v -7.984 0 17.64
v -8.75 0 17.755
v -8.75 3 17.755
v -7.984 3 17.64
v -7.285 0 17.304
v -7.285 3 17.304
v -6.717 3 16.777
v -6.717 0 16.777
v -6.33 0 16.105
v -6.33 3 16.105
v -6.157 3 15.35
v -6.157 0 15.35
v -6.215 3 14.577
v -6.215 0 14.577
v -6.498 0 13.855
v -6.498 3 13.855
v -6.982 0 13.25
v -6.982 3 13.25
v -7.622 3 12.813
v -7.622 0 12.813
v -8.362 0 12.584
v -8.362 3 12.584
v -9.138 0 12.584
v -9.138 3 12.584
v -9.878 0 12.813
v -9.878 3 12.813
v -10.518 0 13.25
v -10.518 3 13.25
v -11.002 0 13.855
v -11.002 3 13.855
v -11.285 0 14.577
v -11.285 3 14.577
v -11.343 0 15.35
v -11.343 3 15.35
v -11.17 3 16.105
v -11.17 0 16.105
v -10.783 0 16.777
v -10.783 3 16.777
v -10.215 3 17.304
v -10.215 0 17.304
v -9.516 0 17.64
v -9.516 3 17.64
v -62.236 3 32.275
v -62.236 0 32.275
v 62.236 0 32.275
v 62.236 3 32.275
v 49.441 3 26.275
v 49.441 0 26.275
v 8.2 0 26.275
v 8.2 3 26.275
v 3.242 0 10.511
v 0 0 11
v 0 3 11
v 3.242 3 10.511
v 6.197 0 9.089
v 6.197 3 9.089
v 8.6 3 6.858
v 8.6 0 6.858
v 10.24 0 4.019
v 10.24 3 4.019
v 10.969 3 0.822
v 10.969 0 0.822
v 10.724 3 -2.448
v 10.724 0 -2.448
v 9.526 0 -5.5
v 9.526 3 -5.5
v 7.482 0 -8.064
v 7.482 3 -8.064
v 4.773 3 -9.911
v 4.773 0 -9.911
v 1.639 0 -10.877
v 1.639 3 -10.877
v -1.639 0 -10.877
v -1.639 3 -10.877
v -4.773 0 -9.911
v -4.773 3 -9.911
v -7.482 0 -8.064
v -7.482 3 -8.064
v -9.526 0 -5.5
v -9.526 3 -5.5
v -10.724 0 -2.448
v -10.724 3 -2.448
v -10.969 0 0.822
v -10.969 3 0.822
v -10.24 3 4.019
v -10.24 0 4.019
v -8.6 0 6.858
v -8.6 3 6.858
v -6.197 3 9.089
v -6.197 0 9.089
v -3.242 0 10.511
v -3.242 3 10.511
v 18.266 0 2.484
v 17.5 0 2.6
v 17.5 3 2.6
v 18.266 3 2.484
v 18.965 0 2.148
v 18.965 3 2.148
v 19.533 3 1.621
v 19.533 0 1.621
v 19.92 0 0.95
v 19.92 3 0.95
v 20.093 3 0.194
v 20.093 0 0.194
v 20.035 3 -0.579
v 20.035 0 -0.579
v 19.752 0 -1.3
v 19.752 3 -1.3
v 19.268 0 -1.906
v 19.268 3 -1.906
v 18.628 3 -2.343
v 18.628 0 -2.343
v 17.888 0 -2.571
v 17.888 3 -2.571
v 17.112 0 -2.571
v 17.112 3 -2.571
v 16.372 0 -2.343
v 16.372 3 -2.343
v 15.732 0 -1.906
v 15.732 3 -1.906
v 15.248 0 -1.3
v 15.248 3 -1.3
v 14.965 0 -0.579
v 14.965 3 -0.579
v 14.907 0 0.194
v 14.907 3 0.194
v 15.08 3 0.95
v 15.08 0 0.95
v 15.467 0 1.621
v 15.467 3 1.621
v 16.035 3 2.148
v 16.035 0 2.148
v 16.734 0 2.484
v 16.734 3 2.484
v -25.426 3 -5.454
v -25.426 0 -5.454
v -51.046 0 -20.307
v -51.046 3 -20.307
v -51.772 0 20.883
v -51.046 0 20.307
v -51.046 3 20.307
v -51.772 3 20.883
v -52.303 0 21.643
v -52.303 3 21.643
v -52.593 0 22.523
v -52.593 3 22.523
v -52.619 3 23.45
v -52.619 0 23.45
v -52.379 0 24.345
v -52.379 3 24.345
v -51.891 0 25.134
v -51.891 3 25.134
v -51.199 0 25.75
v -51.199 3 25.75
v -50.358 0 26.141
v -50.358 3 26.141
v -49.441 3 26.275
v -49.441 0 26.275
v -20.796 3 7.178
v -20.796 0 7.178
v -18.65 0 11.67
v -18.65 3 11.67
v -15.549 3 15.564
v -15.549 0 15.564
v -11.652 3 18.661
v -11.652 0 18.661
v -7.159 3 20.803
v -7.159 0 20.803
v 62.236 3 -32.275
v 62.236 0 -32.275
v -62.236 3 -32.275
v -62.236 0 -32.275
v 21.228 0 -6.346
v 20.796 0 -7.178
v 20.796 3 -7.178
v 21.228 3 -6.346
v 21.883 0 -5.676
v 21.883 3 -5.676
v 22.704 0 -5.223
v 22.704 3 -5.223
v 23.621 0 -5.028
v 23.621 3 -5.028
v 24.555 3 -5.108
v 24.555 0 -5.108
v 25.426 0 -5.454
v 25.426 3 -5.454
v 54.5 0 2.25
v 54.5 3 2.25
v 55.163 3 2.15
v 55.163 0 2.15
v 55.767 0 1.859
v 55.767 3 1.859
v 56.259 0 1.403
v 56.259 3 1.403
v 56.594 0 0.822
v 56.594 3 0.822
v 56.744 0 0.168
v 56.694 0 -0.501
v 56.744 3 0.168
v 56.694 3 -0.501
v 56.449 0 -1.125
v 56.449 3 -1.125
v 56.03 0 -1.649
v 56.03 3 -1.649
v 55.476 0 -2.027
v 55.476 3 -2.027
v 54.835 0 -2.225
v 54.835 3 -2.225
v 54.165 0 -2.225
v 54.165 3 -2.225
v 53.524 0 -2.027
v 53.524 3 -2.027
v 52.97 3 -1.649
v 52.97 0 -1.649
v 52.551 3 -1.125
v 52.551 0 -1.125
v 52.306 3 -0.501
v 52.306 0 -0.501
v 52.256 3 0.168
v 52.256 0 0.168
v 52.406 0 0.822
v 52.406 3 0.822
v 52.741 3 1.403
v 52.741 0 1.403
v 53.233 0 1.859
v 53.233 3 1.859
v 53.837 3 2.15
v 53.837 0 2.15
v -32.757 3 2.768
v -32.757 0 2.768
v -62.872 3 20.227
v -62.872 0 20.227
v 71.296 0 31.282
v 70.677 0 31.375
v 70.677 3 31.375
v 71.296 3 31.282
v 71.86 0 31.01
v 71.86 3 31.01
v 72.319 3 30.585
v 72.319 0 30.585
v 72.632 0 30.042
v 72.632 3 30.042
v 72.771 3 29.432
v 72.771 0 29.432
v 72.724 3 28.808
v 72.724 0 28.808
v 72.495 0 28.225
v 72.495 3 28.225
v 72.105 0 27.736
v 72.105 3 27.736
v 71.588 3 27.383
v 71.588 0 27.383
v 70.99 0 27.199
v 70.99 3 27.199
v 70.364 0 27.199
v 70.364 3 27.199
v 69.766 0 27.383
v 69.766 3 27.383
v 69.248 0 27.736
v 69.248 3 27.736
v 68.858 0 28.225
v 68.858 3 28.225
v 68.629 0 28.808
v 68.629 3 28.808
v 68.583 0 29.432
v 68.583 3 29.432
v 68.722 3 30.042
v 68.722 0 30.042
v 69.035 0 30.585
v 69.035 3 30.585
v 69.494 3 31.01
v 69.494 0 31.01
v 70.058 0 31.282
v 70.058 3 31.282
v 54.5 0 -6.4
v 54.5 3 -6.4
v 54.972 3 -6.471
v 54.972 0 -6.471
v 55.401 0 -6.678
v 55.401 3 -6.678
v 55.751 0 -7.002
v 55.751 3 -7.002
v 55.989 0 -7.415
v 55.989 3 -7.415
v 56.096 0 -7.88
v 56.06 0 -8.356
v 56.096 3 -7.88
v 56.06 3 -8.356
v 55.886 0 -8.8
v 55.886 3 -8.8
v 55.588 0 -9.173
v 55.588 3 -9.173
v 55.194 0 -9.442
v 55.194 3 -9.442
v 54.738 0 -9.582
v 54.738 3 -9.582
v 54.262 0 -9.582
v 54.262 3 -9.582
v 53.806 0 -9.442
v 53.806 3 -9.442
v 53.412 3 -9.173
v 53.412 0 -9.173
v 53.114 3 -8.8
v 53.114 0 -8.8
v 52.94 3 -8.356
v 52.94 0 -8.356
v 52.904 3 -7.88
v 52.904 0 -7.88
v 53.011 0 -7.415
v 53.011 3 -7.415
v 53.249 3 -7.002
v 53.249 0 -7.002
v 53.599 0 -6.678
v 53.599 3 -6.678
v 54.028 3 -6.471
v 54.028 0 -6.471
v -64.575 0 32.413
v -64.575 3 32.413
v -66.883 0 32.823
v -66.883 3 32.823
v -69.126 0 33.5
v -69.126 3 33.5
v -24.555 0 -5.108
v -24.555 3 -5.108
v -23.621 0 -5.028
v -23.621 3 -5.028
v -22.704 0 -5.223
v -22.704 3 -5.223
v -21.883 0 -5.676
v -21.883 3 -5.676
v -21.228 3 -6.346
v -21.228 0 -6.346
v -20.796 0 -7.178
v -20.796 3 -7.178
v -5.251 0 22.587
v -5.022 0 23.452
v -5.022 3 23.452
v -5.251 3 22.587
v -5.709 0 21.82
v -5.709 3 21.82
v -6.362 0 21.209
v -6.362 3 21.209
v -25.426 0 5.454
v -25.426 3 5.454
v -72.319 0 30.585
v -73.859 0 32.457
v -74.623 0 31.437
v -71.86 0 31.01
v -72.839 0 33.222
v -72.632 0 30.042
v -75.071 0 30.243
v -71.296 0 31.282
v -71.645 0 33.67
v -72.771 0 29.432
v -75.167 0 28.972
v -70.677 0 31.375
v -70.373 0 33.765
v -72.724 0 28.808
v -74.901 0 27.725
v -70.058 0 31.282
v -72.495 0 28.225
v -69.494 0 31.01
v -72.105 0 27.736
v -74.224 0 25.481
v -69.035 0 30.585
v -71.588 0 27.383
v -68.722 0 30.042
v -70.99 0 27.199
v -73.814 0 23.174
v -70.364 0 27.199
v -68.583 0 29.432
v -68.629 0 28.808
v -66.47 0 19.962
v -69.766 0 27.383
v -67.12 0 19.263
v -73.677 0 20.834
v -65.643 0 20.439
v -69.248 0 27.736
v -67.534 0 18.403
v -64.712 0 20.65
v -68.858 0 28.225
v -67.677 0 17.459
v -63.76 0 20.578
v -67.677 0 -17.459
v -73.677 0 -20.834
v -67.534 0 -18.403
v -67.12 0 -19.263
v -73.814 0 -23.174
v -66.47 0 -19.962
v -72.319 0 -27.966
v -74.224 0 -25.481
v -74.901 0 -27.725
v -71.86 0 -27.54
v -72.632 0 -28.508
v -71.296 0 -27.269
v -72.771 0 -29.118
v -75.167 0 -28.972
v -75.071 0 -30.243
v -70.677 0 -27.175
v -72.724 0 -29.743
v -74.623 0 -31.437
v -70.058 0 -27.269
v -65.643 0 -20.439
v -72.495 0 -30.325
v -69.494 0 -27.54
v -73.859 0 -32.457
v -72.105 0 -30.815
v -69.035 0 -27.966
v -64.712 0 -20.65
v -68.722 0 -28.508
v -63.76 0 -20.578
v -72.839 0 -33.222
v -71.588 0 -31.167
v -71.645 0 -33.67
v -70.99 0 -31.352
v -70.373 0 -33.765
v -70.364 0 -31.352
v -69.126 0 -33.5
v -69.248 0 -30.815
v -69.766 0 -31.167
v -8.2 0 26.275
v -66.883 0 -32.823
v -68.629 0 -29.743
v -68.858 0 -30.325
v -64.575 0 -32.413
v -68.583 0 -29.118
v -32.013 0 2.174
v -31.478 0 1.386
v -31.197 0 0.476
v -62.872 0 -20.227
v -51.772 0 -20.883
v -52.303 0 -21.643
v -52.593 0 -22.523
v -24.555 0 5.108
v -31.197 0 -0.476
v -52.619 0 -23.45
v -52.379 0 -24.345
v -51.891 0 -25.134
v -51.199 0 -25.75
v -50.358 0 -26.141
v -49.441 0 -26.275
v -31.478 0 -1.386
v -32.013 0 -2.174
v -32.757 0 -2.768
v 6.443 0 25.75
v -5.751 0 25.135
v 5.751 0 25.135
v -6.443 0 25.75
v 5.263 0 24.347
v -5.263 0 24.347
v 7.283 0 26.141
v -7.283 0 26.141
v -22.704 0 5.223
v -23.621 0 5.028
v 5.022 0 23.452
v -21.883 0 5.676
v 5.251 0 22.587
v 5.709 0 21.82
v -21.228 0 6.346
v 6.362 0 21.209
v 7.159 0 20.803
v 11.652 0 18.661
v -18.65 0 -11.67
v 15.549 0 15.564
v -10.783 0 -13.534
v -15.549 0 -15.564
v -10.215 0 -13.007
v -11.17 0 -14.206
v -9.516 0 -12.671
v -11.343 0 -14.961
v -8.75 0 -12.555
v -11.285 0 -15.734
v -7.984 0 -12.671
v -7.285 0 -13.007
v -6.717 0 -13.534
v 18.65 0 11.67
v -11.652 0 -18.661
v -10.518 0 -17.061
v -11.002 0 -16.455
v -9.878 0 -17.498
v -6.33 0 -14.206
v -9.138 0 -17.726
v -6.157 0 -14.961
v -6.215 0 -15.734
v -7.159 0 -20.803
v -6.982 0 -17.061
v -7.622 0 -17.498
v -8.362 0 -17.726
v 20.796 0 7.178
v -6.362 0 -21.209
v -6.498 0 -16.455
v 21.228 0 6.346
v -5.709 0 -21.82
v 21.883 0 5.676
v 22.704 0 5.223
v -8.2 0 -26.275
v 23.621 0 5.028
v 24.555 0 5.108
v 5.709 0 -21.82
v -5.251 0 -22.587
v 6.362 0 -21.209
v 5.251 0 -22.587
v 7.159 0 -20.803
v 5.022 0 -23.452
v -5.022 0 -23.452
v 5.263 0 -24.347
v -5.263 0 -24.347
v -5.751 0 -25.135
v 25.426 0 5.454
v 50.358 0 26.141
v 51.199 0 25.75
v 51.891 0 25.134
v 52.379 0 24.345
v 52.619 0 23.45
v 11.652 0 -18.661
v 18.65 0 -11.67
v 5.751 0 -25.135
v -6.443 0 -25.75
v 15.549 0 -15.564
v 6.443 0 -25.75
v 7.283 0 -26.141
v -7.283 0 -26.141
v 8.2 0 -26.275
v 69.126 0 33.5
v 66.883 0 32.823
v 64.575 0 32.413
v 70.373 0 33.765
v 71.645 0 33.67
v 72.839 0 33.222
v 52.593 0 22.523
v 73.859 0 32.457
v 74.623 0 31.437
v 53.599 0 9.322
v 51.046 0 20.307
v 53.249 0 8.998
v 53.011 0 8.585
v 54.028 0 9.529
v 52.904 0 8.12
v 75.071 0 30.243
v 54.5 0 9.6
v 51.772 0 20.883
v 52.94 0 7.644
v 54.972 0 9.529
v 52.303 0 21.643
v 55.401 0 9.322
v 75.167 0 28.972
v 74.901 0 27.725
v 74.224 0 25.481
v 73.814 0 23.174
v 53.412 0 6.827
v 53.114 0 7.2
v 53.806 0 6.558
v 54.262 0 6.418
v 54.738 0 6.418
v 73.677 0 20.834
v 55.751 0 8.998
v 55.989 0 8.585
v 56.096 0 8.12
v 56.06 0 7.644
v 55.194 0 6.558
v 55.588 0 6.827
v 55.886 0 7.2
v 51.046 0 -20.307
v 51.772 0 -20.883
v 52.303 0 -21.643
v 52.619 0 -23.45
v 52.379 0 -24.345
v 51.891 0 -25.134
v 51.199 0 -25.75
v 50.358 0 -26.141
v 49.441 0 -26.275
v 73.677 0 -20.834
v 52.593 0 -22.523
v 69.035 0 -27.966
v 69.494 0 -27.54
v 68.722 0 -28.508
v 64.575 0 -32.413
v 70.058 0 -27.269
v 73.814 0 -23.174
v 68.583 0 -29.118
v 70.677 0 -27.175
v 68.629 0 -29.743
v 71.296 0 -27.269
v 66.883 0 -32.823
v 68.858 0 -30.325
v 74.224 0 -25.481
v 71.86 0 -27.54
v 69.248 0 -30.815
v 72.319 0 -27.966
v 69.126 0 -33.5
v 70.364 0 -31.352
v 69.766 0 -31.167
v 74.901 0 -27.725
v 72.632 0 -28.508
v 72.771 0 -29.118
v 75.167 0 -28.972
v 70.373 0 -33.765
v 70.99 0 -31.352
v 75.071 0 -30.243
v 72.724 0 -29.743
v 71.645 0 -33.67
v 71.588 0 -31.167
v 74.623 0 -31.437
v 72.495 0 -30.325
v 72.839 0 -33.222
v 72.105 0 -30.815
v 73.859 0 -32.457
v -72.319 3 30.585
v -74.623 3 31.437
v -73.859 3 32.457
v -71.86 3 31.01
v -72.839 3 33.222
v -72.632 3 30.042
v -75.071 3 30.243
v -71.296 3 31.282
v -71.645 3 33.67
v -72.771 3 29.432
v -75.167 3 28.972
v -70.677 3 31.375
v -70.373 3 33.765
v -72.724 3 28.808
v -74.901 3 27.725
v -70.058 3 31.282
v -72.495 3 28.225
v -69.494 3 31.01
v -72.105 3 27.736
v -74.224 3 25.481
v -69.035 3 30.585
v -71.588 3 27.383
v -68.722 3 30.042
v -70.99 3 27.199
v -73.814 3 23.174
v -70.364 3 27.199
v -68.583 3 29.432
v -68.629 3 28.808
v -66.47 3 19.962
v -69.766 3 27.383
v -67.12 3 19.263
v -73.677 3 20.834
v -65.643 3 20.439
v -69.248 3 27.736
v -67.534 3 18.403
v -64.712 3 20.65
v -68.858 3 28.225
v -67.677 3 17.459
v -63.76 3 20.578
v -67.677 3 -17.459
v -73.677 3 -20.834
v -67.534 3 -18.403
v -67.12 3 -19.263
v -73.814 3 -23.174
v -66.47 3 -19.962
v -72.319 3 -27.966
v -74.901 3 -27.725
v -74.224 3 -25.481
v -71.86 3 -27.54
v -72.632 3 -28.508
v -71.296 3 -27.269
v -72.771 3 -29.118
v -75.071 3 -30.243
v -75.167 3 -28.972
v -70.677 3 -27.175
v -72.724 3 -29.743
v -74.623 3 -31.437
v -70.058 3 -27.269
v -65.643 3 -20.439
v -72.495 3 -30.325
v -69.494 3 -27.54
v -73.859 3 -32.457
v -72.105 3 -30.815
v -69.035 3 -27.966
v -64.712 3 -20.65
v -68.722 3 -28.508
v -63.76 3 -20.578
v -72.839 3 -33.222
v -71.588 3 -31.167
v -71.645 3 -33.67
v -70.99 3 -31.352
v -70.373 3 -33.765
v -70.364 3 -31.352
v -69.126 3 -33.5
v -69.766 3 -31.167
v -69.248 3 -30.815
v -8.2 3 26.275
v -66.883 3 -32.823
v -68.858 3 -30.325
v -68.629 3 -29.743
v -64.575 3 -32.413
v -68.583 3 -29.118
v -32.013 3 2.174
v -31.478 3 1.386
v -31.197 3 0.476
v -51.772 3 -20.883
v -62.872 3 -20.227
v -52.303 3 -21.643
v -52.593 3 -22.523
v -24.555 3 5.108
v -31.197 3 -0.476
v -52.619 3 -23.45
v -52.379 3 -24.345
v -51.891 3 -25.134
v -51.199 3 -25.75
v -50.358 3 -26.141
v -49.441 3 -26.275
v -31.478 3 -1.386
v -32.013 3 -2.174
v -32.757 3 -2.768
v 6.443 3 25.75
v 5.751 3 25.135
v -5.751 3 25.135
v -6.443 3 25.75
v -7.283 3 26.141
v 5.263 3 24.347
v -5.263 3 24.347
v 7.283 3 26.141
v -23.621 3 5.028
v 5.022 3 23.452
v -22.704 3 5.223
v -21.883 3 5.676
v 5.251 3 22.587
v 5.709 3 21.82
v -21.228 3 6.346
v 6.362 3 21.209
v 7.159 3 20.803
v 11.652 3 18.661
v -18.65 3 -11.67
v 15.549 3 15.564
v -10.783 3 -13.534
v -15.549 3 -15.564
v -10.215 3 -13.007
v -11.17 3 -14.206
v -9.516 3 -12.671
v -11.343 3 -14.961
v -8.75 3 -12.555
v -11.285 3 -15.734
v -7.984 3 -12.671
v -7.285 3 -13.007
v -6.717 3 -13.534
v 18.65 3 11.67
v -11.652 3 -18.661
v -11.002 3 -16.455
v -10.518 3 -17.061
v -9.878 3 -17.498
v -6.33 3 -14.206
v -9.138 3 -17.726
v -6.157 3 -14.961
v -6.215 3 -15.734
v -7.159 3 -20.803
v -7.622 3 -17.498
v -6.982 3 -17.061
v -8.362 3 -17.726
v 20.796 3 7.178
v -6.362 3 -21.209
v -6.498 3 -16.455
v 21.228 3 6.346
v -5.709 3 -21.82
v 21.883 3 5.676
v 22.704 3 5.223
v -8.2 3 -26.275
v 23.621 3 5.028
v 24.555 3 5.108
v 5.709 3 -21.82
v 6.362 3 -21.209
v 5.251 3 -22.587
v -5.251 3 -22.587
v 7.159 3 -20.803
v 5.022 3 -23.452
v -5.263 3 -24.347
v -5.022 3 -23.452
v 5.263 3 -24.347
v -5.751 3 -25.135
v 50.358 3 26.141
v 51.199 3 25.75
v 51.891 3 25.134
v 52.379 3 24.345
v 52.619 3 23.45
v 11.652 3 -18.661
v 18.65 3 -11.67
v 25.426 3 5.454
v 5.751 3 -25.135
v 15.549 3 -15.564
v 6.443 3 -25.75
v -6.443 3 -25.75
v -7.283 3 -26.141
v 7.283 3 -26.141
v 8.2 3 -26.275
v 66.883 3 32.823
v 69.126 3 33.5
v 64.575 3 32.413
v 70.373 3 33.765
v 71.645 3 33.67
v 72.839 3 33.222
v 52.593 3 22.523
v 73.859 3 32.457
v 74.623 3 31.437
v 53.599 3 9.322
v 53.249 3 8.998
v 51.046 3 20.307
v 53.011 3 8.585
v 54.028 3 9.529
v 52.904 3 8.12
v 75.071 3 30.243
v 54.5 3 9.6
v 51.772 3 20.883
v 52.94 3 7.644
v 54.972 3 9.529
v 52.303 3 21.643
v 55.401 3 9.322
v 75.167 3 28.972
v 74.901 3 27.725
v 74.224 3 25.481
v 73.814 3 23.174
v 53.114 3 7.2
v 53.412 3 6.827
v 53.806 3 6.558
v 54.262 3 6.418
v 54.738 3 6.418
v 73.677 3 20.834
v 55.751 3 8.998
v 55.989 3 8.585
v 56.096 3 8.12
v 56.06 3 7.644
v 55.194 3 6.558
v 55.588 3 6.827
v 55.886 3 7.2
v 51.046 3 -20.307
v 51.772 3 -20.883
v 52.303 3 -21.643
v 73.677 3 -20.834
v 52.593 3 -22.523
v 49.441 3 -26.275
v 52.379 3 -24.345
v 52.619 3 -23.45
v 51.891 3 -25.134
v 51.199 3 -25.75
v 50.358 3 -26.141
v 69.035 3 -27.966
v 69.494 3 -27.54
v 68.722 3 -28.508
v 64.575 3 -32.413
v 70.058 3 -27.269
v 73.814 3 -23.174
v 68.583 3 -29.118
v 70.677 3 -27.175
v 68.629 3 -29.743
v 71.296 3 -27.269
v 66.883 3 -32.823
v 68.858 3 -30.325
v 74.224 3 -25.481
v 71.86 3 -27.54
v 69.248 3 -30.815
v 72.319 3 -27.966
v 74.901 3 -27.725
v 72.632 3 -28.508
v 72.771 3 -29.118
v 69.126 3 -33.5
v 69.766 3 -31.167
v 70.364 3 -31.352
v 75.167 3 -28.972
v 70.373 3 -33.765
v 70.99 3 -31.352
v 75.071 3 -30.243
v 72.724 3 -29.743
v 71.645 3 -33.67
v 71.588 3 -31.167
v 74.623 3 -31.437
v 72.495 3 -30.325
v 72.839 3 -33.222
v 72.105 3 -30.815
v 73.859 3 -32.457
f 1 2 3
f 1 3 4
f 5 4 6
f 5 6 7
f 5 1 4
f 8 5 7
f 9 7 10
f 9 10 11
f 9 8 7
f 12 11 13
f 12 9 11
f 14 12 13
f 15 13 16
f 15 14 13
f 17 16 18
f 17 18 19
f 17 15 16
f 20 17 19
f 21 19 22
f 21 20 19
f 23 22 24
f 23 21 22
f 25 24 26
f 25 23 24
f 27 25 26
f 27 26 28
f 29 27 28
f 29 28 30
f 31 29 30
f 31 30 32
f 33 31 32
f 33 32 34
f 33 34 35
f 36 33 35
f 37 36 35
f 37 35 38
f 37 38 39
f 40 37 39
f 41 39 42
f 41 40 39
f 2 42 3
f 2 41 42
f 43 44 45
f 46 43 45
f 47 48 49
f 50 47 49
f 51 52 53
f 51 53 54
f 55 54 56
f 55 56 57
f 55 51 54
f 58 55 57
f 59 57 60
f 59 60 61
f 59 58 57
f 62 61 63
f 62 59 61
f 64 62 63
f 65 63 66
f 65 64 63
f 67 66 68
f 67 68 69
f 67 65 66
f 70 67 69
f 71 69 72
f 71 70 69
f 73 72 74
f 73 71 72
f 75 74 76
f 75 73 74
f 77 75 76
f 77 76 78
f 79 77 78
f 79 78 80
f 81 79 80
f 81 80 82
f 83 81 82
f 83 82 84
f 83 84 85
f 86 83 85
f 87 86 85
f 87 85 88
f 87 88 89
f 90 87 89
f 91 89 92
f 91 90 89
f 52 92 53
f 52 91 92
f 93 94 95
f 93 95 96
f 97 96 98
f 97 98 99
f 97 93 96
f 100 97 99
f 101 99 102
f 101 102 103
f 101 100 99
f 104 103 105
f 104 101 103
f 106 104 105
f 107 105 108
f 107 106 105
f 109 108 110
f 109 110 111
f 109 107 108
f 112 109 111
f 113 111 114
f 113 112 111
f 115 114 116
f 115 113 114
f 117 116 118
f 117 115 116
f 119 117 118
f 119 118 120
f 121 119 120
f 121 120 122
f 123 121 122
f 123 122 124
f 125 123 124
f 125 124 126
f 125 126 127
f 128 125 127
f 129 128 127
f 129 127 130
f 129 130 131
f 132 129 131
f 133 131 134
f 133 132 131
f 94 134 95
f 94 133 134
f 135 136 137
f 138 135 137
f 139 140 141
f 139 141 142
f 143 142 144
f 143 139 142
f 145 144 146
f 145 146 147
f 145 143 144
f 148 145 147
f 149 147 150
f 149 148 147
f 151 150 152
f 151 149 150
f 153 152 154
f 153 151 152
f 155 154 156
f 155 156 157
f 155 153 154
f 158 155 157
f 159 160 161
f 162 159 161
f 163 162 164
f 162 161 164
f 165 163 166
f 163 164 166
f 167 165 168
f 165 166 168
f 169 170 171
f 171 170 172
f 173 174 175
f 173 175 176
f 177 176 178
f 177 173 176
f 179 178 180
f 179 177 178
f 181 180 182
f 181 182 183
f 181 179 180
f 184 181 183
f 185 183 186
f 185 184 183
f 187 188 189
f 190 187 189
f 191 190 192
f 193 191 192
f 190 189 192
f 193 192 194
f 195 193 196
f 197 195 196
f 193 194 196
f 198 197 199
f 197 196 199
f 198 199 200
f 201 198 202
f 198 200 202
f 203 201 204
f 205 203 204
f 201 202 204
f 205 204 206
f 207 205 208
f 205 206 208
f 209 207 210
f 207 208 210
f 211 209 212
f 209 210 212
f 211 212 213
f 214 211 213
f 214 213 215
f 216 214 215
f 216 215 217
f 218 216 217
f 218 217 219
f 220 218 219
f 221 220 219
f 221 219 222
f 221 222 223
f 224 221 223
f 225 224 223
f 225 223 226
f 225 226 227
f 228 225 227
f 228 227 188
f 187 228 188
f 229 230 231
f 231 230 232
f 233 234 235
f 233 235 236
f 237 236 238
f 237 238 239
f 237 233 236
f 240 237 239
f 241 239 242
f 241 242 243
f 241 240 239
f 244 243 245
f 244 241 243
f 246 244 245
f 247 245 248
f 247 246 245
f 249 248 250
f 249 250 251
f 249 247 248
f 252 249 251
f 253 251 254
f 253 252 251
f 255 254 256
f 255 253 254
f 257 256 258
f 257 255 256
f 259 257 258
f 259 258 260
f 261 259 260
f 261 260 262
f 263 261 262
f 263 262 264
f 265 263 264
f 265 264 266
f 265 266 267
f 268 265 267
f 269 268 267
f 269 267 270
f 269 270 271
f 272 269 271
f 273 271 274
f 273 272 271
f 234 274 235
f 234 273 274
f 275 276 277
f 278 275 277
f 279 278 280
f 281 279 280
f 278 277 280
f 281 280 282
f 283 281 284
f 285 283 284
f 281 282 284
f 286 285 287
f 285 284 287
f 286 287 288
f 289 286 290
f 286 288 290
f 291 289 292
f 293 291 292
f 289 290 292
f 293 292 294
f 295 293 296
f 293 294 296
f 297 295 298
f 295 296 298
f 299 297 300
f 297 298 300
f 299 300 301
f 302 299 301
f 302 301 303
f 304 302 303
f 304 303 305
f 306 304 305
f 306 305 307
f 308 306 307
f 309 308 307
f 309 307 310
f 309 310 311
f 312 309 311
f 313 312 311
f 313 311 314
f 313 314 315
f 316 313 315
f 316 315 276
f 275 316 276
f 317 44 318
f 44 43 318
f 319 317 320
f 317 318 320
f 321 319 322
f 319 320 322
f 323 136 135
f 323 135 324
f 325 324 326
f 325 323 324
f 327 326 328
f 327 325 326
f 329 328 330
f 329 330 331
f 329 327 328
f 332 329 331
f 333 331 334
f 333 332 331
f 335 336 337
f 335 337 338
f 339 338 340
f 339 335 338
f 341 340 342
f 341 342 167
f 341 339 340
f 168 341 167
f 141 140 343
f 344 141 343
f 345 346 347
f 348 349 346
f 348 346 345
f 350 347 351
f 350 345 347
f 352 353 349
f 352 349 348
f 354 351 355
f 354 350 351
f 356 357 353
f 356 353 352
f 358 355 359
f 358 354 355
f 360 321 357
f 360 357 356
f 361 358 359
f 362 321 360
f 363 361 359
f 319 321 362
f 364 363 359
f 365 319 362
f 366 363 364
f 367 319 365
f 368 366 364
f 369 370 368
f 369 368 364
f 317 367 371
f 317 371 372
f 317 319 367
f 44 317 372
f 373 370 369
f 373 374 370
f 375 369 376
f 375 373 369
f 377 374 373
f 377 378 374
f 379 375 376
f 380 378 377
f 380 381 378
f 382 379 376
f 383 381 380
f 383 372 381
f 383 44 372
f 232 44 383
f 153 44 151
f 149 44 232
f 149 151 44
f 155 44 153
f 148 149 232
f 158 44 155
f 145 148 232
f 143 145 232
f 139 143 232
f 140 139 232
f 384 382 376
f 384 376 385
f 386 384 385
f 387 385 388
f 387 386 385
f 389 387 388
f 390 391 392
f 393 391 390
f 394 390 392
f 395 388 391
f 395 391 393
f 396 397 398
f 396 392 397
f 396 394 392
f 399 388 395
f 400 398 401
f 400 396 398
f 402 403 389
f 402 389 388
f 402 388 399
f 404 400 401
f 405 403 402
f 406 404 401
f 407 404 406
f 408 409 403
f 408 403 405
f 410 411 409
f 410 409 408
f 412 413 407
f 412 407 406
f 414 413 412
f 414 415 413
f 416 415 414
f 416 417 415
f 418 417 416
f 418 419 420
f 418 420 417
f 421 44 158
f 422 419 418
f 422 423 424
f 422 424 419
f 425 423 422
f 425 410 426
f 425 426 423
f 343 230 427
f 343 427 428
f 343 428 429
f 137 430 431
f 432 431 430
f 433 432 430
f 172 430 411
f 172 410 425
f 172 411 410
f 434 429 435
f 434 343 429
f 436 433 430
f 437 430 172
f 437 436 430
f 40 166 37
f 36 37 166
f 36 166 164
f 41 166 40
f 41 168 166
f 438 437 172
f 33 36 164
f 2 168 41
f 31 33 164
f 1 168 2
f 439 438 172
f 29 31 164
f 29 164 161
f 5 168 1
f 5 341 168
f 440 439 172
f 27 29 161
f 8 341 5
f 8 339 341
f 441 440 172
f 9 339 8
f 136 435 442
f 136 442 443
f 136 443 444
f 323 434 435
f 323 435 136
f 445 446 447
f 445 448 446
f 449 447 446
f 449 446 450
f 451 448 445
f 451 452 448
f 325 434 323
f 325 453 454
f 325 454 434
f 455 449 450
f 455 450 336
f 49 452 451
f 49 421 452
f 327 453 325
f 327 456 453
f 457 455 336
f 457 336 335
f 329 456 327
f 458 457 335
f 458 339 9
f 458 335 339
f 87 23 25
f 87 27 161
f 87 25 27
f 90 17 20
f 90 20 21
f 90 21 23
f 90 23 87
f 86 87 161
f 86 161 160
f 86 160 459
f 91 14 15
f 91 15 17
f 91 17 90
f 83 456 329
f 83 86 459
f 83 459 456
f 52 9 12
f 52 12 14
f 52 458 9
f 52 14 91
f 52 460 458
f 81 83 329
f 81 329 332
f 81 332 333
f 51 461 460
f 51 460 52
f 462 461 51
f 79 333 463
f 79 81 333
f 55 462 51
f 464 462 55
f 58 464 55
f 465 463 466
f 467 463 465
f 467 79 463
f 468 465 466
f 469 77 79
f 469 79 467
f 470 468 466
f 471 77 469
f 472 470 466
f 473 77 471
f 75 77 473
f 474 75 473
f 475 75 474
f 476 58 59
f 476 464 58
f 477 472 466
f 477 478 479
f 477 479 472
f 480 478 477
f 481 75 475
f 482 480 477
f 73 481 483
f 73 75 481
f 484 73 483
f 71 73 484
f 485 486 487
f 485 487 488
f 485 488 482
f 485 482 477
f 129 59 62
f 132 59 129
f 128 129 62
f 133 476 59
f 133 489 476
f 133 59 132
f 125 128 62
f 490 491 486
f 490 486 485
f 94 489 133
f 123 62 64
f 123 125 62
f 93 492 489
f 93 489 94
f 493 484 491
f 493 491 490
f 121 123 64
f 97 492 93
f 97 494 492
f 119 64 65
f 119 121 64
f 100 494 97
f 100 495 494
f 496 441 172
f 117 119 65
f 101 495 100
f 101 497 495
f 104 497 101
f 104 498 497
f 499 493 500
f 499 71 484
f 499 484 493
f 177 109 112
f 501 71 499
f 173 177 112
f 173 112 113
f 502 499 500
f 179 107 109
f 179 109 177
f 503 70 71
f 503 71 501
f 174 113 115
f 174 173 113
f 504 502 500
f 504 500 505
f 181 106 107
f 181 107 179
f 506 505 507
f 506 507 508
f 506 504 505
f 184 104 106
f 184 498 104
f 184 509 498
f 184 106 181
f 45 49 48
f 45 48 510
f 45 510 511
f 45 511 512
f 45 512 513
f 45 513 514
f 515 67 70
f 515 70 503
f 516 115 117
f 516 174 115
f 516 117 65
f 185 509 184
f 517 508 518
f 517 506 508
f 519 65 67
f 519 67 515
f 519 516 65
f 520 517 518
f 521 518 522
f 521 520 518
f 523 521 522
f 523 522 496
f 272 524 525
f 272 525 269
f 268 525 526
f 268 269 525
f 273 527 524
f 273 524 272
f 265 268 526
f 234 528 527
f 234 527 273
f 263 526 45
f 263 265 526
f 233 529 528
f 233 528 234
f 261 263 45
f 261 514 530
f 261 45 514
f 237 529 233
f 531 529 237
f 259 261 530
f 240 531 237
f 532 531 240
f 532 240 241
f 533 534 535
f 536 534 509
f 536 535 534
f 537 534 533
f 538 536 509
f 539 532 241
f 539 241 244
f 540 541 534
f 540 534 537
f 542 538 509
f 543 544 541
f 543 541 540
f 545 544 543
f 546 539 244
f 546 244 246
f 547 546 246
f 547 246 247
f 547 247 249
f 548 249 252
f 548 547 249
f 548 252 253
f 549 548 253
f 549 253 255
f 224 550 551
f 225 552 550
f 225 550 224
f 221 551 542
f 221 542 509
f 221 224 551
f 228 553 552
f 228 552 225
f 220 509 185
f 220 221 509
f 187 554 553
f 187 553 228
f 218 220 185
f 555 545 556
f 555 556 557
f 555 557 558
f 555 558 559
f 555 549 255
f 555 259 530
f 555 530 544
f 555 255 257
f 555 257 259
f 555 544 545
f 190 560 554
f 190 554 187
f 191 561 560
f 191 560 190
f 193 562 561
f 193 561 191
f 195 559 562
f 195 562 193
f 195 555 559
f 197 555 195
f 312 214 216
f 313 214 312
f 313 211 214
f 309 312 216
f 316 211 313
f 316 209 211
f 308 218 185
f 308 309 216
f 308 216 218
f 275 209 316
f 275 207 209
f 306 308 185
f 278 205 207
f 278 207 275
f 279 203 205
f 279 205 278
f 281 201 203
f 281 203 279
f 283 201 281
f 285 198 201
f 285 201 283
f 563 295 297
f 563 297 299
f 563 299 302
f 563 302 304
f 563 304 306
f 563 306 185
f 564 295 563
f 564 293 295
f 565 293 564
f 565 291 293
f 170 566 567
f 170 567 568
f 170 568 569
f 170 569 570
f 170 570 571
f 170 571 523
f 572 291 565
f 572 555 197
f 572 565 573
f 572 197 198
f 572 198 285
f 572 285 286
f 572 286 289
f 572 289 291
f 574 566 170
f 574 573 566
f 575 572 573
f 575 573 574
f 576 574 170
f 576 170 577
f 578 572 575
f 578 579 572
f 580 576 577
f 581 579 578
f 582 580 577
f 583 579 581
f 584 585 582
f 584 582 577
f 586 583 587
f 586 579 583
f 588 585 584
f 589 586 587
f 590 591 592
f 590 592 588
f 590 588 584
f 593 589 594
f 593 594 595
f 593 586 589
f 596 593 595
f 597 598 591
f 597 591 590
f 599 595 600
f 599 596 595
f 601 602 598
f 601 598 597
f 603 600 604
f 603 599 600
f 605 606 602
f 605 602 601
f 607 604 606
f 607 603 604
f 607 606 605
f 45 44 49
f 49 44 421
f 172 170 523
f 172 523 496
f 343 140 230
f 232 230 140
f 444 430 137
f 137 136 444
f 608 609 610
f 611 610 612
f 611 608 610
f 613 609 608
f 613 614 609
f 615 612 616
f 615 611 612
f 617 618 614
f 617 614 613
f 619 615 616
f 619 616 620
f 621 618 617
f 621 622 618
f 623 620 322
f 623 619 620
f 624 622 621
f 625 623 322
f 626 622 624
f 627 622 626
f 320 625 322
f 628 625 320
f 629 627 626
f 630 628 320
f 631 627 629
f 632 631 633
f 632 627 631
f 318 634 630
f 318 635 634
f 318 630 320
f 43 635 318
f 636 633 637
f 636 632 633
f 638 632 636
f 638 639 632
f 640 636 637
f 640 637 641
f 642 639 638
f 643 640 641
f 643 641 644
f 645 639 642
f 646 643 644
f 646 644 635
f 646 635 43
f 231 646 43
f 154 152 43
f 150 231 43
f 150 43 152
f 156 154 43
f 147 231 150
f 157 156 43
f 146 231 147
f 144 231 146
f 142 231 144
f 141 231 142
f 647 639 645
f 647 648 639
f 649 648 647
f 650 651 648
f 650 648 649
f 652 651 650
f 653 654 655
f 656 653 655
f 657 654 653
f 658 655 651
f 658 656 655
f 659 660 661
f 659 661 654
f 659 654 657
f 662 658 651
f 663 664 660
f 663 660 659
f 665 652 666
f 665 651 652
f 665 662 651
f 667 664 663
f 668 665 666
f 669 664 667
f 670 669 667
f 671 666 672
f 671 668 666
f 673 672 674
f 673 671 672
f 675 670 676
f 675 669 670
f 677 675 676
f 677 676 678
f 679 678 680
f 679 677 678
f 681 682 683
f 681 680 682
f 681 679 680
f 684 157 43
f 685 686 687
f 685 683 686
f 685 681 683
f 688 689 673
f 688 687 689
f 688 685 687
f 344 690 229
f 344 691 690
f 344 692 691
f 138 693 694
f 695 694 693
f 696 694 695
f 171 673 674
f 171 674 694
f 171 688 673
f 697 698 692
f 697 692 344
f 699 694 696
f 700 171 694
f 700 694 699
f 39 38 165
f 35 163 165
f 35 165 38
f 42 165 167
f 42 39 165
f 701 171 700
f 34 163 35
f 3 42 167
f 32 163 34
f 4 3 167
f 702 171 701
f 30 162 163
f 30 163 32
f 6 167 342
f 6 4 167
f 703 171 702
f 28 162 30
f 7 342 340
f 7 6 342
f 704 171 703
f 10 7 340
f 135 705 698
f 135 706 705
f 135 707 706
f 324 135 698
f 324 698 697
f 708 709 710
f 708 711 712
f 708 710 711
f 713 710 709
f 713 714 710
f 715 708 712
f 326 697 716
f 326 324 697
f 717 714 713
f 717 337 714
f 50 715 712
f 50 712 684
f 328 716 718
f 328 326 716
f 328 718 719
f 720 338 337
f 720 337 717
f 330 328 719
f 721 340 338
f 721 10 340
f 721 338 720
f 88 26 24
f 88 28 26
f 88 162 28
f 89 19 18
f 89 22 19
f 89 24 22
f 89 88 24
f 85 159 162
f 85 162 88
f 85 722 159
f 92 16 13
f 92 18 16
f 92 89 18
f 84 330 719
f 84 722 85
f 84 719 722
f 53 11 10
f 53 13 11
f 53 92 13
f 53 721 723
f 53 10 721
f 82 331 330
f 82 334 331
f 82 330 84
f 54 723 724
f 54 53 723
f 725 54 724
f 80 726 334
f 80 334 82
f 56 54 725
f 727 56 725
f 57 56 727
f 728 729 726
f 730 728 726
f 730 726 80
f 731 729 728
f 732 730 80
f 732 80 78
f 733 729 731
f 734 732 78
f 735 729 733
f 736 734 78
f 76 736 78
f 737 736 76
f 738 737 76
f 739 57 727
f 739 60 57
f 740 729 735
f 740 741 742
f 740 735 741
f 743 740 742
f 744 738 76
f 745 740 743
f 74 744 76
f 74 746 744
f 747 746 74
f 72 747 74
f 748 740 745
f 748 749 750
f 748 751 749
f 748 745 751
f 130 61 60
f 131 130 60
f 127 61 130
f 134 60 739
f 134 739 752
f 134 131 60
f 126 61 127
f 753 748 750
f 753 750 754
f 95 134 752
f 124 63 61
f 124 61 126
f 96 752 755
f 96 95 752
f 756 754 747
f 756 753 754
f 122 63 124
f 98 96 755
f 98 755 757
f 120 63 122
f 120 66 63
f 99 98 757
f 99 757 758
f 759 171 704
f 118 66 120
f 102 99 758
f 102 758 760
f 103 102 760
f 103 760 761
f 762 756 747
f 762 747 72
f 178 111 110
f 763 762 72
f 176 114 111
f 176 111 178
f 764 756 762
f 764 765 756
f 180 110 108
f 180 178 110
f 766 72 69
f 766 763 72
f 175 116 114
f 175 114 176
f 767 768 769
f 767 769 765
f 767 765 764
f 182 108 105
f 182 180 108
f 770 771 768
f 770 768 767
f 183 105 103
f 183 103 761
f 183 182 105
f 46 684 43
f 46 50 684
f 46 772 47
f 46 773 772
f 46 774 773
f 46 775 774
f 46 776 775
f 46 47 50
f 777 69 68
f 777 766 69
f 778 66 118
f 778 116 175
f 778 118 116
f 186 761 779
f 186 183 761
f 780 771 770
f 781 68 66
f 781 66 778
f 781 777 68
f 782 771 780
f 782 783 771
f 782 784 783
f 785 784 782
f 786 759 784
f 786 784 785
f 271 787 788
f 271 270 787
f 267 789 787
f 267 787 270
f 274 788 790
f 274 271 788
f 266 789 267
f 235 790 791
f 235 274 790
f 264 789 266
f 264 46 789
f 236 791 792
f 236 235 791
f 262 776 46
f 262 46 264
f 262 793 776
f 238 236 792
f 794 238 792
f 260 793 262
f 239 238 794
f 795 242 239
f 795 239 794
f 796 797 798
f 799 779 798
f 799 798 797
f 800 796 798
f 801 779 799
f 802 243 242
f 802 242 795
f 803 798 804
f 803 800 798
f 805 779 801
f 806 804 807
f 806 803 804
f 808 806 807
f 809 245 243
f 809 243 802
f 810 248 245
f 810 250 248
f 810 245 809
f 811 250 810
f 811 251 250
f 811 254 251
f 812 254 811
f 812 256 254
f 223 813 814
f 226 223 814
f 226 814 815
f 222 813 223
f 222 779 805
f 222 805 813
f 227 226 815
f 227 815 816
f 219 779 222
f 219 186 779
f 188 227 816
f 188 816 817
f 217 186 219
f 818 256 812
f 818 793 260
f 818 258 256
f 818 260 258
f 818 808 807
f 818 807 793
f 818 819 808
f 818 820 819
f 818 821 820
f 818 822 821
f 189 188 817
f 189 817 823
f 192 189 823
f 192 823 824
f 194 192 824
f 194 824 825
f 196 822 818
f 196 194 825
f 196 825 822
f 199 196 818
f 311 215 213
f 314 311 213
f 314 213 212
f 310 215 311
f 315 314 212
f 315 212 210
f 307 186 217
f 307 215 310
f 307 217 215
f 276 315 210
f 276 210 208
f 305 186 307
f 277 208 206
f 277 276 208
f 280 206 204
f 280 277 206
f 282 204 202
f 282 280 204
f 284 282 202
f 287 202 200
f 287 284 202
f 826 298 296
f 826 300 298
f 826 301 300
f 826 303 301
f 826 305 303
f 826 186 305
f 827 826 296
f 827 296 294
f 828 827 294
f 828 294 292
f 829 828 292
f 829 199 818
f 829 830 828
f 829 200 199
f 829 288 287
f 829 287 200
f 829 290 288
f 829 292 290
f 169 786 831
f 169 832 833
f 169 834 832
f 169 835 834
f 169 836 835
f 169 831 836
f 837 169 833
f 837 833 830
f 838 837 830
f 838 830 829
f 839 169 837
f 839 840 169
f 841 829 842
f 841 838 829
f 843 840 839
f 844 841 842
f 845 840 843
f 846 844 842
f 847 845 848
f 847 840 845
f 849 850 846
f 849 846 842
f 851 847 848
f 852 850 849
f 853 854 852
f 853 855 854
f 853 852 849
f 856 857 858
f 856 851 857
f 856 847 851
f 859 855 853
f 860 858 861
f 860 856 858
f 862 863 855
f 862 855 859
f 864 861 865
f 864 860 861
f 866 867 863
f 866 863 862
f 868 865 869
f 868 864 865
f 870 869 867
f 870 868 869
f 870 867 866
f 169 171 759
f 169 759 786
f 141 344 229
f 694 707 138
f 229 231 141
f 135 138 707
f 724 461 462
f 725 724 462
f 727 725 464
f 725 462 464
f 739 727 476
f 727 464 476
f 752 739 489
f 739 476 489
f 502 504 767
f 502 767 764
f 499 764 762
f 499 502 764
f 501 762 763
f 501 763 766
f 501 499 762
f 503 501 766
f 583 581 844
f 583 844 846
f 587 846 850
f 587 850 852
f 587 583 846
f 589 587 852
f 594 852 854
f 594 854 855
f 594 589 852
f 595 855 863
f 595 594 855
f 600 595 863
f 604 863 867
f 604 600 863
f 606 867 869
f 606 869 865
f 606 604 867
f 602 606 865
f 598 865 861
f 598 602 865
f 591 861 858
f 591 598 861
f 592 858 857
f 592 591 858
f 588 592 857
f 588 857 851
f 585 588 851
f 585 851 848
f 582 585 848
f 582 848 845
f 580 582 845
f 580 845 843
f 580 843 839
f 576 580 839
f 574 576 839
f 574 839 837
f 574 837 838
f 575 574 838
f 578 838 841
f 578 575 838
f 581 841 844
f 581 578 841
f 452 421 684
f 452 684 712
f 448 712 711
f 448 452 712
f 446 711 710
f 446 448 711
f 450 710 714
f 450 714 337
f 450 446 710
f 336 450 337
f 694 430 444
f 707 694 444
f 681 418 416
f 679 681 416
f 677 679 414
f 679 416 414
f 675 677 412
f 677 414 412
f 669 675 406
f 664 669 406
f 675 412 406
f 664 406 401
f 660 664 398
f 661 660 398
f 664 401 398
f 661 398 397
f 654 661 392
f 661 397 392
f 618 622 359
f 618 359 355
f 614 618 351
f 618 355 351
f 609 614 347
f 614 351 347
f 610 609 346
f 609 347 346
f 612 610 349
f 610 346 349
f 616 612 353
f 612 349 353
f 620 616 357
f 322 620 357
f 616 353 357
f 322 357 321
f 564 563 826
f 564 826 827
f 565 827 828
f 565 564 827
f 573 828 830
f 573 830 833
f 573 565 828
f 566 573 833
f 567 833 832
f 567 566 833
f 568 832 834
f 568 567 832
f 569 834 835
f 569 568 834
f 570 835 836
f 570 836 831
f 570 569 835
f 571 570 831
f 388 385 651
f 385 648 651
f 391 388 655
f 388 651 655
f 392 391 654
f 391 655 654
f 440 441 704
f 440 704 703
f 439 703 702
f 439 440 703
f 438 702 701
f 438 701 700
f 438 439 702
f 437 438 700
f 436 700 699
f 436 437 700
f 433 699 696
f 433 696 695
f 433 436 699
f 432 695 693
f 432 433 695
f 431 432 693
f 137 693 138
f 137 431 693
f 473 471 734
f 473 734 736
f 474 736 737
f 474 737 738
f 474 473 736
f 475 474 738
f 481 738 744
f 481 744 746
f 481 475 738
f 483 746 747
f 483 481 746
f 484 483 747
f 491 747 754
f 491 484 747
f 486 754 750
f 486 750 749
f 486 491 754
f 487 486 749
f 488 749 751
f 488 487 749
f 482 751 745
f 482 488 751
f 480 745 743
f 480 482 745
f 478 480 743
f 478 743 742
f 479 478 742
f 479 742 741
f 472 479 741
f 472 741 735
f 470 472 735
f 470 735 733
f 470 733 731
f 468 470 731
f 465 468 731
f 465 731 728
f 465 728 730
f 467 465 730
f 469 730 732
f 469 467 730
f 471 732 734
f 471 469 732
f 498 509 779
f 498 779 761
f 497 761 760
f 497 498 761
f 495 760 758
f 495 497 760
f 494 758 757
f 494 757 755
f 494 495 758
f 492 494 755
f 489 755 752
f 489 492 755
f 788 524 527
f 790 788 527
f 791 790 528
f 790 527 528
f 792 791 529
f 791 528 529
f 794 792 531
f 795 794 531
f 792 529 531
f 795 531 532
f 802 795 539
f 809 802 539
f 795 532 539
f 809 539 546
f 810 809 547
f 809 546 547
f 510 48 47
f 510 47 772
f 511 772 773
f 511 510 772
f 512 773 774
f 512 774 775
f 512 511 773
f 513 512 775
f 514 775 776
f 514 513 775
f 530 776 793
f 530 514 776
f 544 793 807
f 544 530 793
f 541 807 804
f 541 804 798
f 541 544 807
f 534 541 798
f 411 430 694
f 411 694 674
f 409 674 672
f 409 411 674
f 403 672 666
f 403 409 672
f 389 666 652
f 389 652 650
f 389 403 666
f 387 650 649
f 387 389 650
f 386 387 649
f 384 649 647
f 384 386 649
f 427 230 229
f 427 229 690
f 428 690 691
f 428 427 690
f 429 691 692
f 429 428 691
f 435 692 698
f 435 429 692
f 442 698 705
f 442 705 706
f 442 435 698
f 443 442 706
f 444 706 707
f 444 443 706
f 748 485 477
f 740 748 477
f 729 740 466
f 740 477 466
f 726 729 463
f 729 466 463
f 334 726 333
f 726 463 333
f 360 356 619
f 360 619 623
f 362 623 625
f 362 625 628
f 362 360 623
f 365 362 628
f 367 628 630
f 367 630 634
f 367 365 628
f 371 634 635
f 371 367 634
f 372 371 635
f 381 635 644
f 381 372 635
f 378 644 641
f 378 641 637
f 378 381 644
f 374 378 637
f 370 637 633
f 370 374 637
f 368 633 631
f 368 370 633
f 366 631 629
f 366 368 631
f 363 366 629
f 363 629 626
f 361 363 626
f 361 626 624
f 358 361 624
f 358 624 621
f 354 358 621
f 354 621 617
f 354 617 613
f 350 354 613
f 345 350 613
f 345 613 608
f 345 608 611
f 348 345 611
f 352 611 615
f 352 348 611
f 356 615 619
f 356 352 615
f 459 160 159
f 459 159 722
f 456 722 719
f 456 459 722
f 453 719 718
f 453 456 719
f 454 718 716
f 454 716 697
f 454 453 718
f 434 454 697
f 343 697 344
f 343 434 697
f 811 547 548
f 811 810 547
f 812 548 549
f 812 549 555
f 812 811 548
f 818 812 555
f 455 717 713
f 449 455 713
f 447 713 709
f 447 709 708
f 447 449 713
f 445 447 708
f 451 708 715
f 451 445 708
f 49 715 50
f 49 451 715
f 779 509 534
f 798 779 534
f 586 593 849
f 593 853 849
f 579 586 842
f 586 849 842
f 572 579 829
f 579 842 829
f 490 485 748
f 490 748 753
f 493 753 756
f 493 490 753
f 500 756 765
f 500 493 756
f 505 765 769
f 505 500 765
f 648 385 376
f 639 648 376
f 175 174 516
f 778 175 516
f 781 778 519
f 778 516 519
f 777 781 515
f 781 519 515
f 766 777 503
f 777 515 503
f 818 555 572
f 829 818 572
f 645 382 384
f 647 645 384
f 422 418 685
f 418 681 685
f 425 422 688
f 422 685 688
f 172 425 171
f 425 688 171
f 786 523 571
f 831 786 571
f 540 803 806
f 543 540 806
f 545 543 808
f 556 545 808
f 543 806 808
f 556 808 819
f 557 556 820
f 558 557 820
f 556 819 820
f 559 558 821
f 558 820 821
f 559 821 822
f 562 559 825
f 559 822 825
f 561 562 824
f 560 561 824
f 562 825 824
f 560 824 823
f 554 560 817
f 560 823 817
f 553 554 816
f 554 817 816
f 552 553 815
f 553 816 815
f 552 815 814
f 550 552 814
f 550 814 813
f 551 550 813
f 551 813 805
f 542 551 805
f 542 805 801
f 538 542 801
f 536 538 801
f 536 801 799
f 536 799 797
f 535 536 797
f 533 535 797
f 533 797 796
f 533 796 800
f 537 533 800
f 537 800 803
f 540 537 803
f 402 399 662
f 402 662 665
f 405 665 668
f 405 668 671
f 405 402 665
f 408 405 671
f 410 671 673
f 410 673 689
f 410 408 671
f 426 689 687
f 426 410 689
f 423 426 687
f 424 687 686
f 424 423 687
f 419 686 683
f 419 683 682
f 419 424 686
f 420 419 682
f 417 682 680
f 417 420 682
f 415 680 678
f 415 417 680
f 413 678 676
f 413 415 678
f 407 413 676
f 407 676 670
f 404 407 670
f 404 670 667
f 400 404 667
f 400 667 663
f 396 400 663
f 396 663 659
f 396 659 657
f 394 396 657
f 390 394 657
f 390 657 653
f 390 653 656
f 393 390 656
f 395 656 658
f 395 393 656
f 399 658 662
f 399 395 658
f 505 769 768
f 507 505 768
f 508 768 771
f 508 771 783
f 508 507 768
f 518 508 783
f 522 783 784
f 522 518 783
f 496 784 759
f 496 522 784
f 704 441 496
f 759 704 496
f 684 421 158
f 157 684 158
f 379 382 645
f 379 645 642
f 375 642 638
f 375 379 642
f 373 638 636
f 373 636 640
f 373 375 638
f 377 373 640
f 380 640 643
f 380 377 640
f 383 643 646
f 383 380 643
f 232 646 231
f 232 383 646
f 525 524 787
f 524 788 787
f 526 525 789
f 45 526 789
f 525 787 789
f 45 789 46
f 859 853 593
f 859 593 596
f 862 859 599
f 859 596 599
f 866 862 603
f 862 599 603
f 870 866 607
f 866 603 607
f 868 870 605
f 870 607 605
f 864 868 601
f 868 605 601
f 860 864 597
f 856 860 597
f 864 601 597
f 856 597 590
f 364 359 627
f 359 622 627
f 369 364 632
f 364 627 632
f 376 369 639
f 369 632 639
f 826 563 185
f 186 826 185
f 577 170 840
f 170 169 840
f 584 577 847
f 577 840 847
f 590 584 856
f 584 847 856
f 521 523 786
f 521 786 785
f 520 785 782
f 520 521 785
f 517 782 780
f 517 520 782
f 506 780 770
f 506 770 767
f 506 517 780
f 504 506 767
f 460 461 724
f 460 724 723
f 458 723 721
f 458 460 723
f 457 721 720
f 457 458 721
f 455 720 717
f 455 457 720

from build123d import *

# Parameters (mm, degrees)
SKETCH_1_R          = 2.1
EXTRUDE_1_DEPTH     = 3
SKETCH_1_R_2        = 22
SKETCH_1_R_3        = 2.6
SKETCH_1_R_4        = 11
EXTRUDE_1_2_DEPTH   = 3
EXTRUDE_START       = -3
EXTRUDE_2_DEPTH     = 3
FILLET_1_R          = 3.2
FILLET_2_R          = 20
EXTRUDE_4_DEPTH     = 3
SKETCH_4_R          = 2.25
SKETCH_4_R_2        = 1.6
CUT_EXTRUDE_1_DEPTH = 83.47010732


with BuildPart() as part:
    # 草图1 → 凸台-拉伸1 (new body)
    with BuildSketch(Plane(origin=(0, 0, 0), x_dir=(1, 0, 0), z_dir=(0, 1, 0))):
        with BuildLine():
            Line((-67.322682271, -32.275282576), (67.322682271, -32.275282576))
            ThreePointArc((67.322682271, -32.275282576), (73.858764752, -32.457263091), (73.676784237, -25.92118061))
            Line((73.676784237, -25.92118061), (73.676784237, 25.92118061))
            ThreePointArc((73.676784237, 25.92118061), (73.858764752, 32.457263091), (67.322682271, 32.275282576))
            Line((67.322682271, 32.275282576), (-67.322682271, 32.275282576))
            ThreePointArc((-67.322682271, 32.275282576), (-73.858764752, 32.457263091), (-73.676784237, 25.92118061))
            Line((-73.676784237, 25.92118061), (-73.676784237, -25.92118061))
            ThreePointArc((-73.676784237, -25.92118061), (-73.858764752, -32.457263091), (-67.322682271, -32.275282576))
        make_face()
        with Locations(Location((70.676784237, -29.275282576, 0), (0, 0, 270))):
            Circle(SKETCH_1_R, mode=Mode.SUBTRACT)
        with Locations(Location((-70.676784237, -29.275282576, 0), (0, 0, 270))):
            Circle(SKETCH_1_R, mode=Mode.SUBTRACT)
        with Locations(Location((70.676784237, 29.275282576, 0), (0, 0, 270))):
            Circle(SKETCH_1_R, mode=Mode.SUBTRACT)
        with Locations(Location((-70.676784237, 29.275282576, 0), (0, 0, 270))):
            Circle(SKETCH_1_R, mode=Mode.SUBTRACT)
        with BuildLine():
            Line((-67.322682271, 26.275282576), (67.322682271, 26.275282576))
            ThreePointArc((67.322682271, 26.275282576), (67.494803722, 26.093302061), (67.676784237, 25.92118061))
            Line((67.676784237, 25.92118061), (67.676784237, -25.92118061))
            ThreePointArc((67.676784237, -25.92118061), (67.494803722, -26.093302061), (67.322682271, -26.275282576))
            Line((67.322682271, -26.275282576), (-67.322682271, -26.275282576))
            ThreePointArc((-67.322682271, -26.275282576), (-67.494803722, -26.093302061), (-67.676784237, -25.92118061))
            Line((-67.676784237, -25.92118061), (-67.676784237, 25.92118061))
            ThreePointArc((-67.676784237, 25.92118061), (-67.494803722, 26.093302061), (-67.322682271, 26.275282576))
        make_face(mode=Mode.SUBTRACT)
    extrude(amount=EXTRUDE_1_DEPTH)



with BuildPart() as body_2:
    # 草图1 → Extrude 1 2 (new body)
    with BuildSketch(Plane(origin=(0, 0, 0), x_dir=(1, 0, 0), z_dir=(0, 1, 0))):
        with Locations(Location((0, 0, 0), (0, 0, 270))):
            Circle(SKETCH_1_R_2)
        with Locations(Location((-8.75, 15.155444566, 0), (0, 0, 270))):
            Circle(SKETCH_1_R_3, mode=Mode.SUBTRACT)
        with Locations(Location((0, 0, 0), (0, 0, 270))):
            Circle(SKETCH_1_R_4, mode=Mode.SUBTRACT)
        with Locations(Location((-8.75, -15.155444566, 0), (0, 0, 270))):
            Circle(SKETCH_1_R_3, mode=Mode.SUBTRACT)
        with Locations(Location((17.5, 0, 0), (0, 0, 270))):
            Circle(SKETCH_1_R_3, mode=Mode.SUBTRACT)
    extrude(amount=EXTRUDE_1_2_DEPTH)


with BuildPart() as part_1:
    add(part.part)

    add(body_2.part)  # 凸台-拉伸2 merges body 2
    # 草图2 → 凸台-拉伸2 (add)
    with BuildSketch(Plane(origin=(0, 3, 0), x_dir=(1, 0, 0), z_dir=(0, 1, 0)).offset(EXTRUDE_START)):
        with BuildLine():
            Line((-5, 26.275282576), (-5, 21.424285286))
            ThreePointArc((-5, 21.424285286), (0, 22), (5, 21.424285286))
            Line((5, 21.424285286), (5, 26.275282576))
            Line((5, 26.275282576), (-5, 26.275282576))
        make_face()
        with BuildLine():
            Line((5, -26.275282576), (5, -21.424285286))
            ThreePointArc((5, -21.424285286), (0, -22), (-5, -21.424285286))
            Line((-5, -21.424285286), (-5, -26.275282576))
            Line((-5, -26.275282576), (5, -26.275282576))
        make_face()
        with BuildLine():
            Line((-67.676784237, 23.012880146), (-27.981475463, 0))
            Line((-27.981475463, 0), (-67.676784237, -23.012880146))
            Line((-67.676784237, -23.012880146), (-67.676784237, -25.92118061))
            ThreePointArc((-67.676784237, -25.92118061), (-67.494803722, -26.093302061), (-67.322682271, -26.275282576))
            Line((-67.322682271, -26.275282576), (-61.341206808, -26.275282576))
            Line((-61.341206808, -26.275282576), (-21.747820556, -3.321490792))
            ThreePointArc((-21.747820556, -3.321490792), (-22, 0), (-21.747820556, 3.321490792))
            Line((-21.747820556, 3.321490792), (-61.341206808, 26.275282576))
            Line((-61.341206808, 26.275282576), (-67.322682271, 26.275282576))
            ThreePointArc((-67.322682271, 26.275282576), (-67.494803722, 26.093302061), (-67.676784237, 25.92118061))
            Line((-67.676784237, 25.92118061), (-67.676784237, 23.012880146))
        make_face()
        with BuildLine():
            Line((61.341206808, 26.275282576), (21.747820556, 3.321490792))
            ThreePointArc((21.747820556, 3.321490792), (22, 0), (21.747820556, -3.321490792))
            Line((21.747820556, -3.321490792), (61.341206808, -26.275282576))
            Line((61.341206808, -26.275282576), (67.322682271, -26.275282576))
            ThreePointArc((67.322682271, -26.275282576), (67.494803722, -26.093302061), (67.676784237, -25.92118061))
            Line((67.676784237, -25.92118061), (67.676784237, -23.012880146))
            Line((67.676784237, -23.012880146), (27.981475463, 0))
            Line((27.981475463, 0), (67.676784237, 23.012880146))
            Line((67.676784237, 23.012880146), (67.676784237, 25.92118061))
            ThreePointArc((67.676784237, 25.92118061), (67.494803722, 26.093302061), (67.322682271, 26.275282576))
            Line((67.322682271, 26.275282576), (61.341206808, 26.275282576))
        make_face()
    extrude(amount=EXTRUDE_2_DEPTH)

    # 圆角1
    # the kernel refuses this fillet: 3.2 mm, written as the material it adds along each edge
    with BuildSketch(Plane(origin=(-27.981475463, 0, 0), x_dir=(-0.8651295335829952, 0, -0.5015484922940843), z_dir=(0, 1, 0))) as fillet_1_piece_1:
        with BuildLine():
            CenterArc((FILLET_1_R * 1.72491702572, FILLET_1_R), FILLET_1_R, 150.205000829, 119.794999171)
            Line((FILLET_1_R * 0.857108199306, FILLET_1_R * 1.49689821976), (0, 0))
            Line((0, 0), (FILLET_1_R * 1.72491702572, 0))
        make_face()
    extrude(amount=3)
    with BuildSketch(Plane(origin=(-67.676784237, 0, 23.012880146), x_dir=(0, 0, -1), z_dir=(0, 1, 0))) as fillet_1_piece_2:
        with BuildLine():
            CenterArc((FILLET_1_R * 1.73563429984, -FILLET_1_R), FILLET_1_R, 90, 120.102500415)
            Line((FILLET_1_R * 0.87050476626, -FILLET_1_R * 1.50154849229), (0, 0))
            Line((0, 0), (FILLET_1_R * 1.73563429984, 0))
        make_face()
    extrude(amount=3)
    with BuildSketch(Plane(origin=(5, 0, 21.424285286), x_dir=(0, 0, 1), z_dir=(0, 1, 0)), Plane(origin=(-5, 0, -21.424285286), x_dir=(0, 0, -1), z_dir=(0, 1, 0))) as fillet_1_piece_3:
        with BuildLine():
            CenterArc((2.404269014, 3.2), FILLET_1_R, 198.989618262, 71.010381738)
            ThreePointArc((-0.621579151, 2.158730159), (-0.283217903, 1.087303995), (0, 0))
            Line((0, 0), (2.404269014, 0))
        make_face()
    extrude(amount=3)
    with BuildSketch(Plane(origin=(21.747820556, 0, 3.321490792), x_dir=(0.8651295335829955, 0, 0.5015484922940839), z_dir=(0, 1, 0)), Plane(origin=(-21.747820556, 0, -3.321490792), x_dir=(-0.8651295335829956, 0, -0.5015484922940837), z_dir=(0, 1, 0))) as fillet_1_piece_4:
        with BuildLine():
            CenterArc((4.251428919, -3.2), FILLET_1_R, 90, 101.059486295)
            ThreePointArc((1.110857558, -3.813849756), (0.641683834, -1.881801424), (0, 0))
            Line((0, 0), (4.251428919, 0))
        make_face()
    extrude(amount=3)
    with BuildSketch(Plane(origin=(61.341206808, 0, 26.275282576), x_dir=(-0.8651295335829955, 0, -0.5015484922940838), z_dir=(0, 1, 0)), Plane(origin=(61.341206808, 0, -26.275282576), x_dir=(-1, 0, 0), z_dir=(0, 1, 0)), Plane(origin=(-61.341206808, 0, 26.275282576), x_dir=(1, 0, 0), z_dir=(0, 1, 0))) as fillet_1_piece_5:
        with BuildLine():
            CenterArc((FILLET_1_R * 3.71874217995, FILLET_1_R), FILLET_1_R, 120.102500415, 149.897499585)
            Line((FILLET_1_R * 3.21719368765, FILLET_1_R * 1.86512953358), (0, 0))
            Line((0, 0), (FILLET_1_R * 3.71874217995, 0))
        make_face()
    extrude(amount=3)
    with BuildSketch(Plane(origin=(5, 0, 26.275282576), x_dir=(1, 0, 0), z_dir=(0, 1, 0)), Plane(origin=(-5, 0, -26.275282576), x_dir=(-1, 0, 0), z_dir=(0, 1, 0)), Plane(origin=(5, 0, -26.275282576), x_dir=(0, 0, 1), z_dir=(0, 1, 0)), Plane(origin=(-5, 0, 26.275282576), x_dir=(0, 0, -1), z_dir=(0, 1, 0))) as fillet_1_piece_6:
        with BuildLine():
            CenterArc((FILLET_1_R, FILLET_1_R), FILLET_1_R, 180, 90)
            Line((0, FILLET_1_R), (0, 0))
            Line((0, 0), (FILLET_1_R, 0))
        make_face()
    extrude(amount=3)
    with BuildSketch(Plane(origin=(-61.341206808, 0, -26.275282576), x_dir=(1, 0, 0), z_dir=(0, 1, 0))) as fillet_1_piece_7:
        with BuildLine():
            CenterArc((FILLET_1_R * 3.71874217995, -FILLET_1_R), FILLET_1_R, 90, 149.897499585)
            Line((FILLET_1_R * 3.21719368765, -FILLET_1_R * 1.86512953358), (0, 0))
            Line((0, 0), (FILLET_1_R * 3.71874217995, 0))
        make_face()
    extrude(amount=3)
    with BuildSketch(Plane(origin=(21.747820556, 0, -3.321490792), x_dir=(0.8651295335829948, 0, -0.5015484922940848), z_dir=(0, 1, 0)), Plane(origin=(-21.747820556, 0, 3.321490792), x_dir=(-0.8651295335829947, 0, 0.5015484922940853), z_dir=(0, 1, 0))) as fillet_1_piece_8:
        with BuildLine():
            CenterArc((4.251428919, 3.2), FILLET_1_R, 168.940513705, 101.059486295)
            ThreePointArc((1.110857558, 3.813849756), (0.641683834, 1.881801424), (0, 0))
            Line((0, 0), (4.251428919, 0))
        make_face()
    extrude(amount=3)
    with BuildSketch(Plane(origin=(5, 0, -21.424285286), x_dir=(0, 0, -1), z_dir=(0, 1, 0)), Plane(origin=(-5, 0, 21.424285286), x_dir=(0, 0, 1), z_dir=(0, 1, 0))) as fillet_1_piece_9:
        with BuildLine():
            CenterArc((2.404269014, -3.2), FILLET_1_R, 90, 71.010381738)
            ThreePointArc((-0.621579151, -2.158730159), (-0.283217903, -1.087303995), (0, 0))
            Line((0, 0), (2.404269014, 0))
        make_face()
    extrude(amount=3)
    with BuildSketch(Plane(origin=(-67.676784237, 0, -23.012880146), x_dir=(0, 0, 1), z_dir=(0, 1, 0))) as fillet_1_piece_10:
        with BuildLine():
            CenterArc((FILLET_1_R * 1.73563429984, FILLET_1_R), FILLET_1_R, 149.897499585, 120.102500415)
            Line((FILLET_1_R * 0.87050476626, FILLET_1_R * 1.50154849229), (0, 0))
            Line((0, 0), (FILLET_1_R * 1.73563429984, 0))
        make_face()
    extrude(amount=3)

    # 圆角2
    fillet_2_edges = [part_1.edges().sort_by_distance(p)[0] for p in [
        (-67.322682271, 1.5, 32.275282576),
        (-73.676784237, 1.5, 25.92118061),
        (-73.676784237, 1.5, -25.92118061),
        (-67.322682271, 1.5, -32.275282576),
        (67.322682271, 1.5, -32.275282576),
        (73.676784237, 1.5, -25.92118061),
        (73.676784237, 1.5, 25.92118061),
        (67.322682271, 1.5, 32.275282576),
    ]]
    fillet(fillet_2_edges, radius=FILLET_2_R)

    # 草图3 → 凸台-拉伸4 (add)
    with BuildSketch(Plane(origin=(0, 3, 0), x_dir=(1, 0, 0), z_dir=(0, 1, 0))):
        Polygon((67.676784237, 23.012880146), (27.981475463, 0), (67.676784237, -23.012880146), align=None)
    extrude(amount=-EXTRUDE_4_DEPTH)

    # 草图4 → 切除-拉伸1 (cut, through all)
    with BuildSketch(Plane(origin=(0, 3, 0), x_dir=(1, 0, 0), z_dir=(0, 1, 0))):
        with Locations(Location((54.5, 0, 0), (0, 0, 270))):
            Circle(SKETCH_4_R)
        with Locations(Location((54.5, 8, 0), (0, 0, 270))):
            Circle(SKETCH_4_R_2)
        with Locations(Location((54.5, -8, 0), (0, 0, 270))):
            Circle(SKETCH_4_R_2)
    extrude(amount=-CUT_EXTRUDE_1_DEPTH, mode=Mode.SUBTRACT)


solid = part_1.part
